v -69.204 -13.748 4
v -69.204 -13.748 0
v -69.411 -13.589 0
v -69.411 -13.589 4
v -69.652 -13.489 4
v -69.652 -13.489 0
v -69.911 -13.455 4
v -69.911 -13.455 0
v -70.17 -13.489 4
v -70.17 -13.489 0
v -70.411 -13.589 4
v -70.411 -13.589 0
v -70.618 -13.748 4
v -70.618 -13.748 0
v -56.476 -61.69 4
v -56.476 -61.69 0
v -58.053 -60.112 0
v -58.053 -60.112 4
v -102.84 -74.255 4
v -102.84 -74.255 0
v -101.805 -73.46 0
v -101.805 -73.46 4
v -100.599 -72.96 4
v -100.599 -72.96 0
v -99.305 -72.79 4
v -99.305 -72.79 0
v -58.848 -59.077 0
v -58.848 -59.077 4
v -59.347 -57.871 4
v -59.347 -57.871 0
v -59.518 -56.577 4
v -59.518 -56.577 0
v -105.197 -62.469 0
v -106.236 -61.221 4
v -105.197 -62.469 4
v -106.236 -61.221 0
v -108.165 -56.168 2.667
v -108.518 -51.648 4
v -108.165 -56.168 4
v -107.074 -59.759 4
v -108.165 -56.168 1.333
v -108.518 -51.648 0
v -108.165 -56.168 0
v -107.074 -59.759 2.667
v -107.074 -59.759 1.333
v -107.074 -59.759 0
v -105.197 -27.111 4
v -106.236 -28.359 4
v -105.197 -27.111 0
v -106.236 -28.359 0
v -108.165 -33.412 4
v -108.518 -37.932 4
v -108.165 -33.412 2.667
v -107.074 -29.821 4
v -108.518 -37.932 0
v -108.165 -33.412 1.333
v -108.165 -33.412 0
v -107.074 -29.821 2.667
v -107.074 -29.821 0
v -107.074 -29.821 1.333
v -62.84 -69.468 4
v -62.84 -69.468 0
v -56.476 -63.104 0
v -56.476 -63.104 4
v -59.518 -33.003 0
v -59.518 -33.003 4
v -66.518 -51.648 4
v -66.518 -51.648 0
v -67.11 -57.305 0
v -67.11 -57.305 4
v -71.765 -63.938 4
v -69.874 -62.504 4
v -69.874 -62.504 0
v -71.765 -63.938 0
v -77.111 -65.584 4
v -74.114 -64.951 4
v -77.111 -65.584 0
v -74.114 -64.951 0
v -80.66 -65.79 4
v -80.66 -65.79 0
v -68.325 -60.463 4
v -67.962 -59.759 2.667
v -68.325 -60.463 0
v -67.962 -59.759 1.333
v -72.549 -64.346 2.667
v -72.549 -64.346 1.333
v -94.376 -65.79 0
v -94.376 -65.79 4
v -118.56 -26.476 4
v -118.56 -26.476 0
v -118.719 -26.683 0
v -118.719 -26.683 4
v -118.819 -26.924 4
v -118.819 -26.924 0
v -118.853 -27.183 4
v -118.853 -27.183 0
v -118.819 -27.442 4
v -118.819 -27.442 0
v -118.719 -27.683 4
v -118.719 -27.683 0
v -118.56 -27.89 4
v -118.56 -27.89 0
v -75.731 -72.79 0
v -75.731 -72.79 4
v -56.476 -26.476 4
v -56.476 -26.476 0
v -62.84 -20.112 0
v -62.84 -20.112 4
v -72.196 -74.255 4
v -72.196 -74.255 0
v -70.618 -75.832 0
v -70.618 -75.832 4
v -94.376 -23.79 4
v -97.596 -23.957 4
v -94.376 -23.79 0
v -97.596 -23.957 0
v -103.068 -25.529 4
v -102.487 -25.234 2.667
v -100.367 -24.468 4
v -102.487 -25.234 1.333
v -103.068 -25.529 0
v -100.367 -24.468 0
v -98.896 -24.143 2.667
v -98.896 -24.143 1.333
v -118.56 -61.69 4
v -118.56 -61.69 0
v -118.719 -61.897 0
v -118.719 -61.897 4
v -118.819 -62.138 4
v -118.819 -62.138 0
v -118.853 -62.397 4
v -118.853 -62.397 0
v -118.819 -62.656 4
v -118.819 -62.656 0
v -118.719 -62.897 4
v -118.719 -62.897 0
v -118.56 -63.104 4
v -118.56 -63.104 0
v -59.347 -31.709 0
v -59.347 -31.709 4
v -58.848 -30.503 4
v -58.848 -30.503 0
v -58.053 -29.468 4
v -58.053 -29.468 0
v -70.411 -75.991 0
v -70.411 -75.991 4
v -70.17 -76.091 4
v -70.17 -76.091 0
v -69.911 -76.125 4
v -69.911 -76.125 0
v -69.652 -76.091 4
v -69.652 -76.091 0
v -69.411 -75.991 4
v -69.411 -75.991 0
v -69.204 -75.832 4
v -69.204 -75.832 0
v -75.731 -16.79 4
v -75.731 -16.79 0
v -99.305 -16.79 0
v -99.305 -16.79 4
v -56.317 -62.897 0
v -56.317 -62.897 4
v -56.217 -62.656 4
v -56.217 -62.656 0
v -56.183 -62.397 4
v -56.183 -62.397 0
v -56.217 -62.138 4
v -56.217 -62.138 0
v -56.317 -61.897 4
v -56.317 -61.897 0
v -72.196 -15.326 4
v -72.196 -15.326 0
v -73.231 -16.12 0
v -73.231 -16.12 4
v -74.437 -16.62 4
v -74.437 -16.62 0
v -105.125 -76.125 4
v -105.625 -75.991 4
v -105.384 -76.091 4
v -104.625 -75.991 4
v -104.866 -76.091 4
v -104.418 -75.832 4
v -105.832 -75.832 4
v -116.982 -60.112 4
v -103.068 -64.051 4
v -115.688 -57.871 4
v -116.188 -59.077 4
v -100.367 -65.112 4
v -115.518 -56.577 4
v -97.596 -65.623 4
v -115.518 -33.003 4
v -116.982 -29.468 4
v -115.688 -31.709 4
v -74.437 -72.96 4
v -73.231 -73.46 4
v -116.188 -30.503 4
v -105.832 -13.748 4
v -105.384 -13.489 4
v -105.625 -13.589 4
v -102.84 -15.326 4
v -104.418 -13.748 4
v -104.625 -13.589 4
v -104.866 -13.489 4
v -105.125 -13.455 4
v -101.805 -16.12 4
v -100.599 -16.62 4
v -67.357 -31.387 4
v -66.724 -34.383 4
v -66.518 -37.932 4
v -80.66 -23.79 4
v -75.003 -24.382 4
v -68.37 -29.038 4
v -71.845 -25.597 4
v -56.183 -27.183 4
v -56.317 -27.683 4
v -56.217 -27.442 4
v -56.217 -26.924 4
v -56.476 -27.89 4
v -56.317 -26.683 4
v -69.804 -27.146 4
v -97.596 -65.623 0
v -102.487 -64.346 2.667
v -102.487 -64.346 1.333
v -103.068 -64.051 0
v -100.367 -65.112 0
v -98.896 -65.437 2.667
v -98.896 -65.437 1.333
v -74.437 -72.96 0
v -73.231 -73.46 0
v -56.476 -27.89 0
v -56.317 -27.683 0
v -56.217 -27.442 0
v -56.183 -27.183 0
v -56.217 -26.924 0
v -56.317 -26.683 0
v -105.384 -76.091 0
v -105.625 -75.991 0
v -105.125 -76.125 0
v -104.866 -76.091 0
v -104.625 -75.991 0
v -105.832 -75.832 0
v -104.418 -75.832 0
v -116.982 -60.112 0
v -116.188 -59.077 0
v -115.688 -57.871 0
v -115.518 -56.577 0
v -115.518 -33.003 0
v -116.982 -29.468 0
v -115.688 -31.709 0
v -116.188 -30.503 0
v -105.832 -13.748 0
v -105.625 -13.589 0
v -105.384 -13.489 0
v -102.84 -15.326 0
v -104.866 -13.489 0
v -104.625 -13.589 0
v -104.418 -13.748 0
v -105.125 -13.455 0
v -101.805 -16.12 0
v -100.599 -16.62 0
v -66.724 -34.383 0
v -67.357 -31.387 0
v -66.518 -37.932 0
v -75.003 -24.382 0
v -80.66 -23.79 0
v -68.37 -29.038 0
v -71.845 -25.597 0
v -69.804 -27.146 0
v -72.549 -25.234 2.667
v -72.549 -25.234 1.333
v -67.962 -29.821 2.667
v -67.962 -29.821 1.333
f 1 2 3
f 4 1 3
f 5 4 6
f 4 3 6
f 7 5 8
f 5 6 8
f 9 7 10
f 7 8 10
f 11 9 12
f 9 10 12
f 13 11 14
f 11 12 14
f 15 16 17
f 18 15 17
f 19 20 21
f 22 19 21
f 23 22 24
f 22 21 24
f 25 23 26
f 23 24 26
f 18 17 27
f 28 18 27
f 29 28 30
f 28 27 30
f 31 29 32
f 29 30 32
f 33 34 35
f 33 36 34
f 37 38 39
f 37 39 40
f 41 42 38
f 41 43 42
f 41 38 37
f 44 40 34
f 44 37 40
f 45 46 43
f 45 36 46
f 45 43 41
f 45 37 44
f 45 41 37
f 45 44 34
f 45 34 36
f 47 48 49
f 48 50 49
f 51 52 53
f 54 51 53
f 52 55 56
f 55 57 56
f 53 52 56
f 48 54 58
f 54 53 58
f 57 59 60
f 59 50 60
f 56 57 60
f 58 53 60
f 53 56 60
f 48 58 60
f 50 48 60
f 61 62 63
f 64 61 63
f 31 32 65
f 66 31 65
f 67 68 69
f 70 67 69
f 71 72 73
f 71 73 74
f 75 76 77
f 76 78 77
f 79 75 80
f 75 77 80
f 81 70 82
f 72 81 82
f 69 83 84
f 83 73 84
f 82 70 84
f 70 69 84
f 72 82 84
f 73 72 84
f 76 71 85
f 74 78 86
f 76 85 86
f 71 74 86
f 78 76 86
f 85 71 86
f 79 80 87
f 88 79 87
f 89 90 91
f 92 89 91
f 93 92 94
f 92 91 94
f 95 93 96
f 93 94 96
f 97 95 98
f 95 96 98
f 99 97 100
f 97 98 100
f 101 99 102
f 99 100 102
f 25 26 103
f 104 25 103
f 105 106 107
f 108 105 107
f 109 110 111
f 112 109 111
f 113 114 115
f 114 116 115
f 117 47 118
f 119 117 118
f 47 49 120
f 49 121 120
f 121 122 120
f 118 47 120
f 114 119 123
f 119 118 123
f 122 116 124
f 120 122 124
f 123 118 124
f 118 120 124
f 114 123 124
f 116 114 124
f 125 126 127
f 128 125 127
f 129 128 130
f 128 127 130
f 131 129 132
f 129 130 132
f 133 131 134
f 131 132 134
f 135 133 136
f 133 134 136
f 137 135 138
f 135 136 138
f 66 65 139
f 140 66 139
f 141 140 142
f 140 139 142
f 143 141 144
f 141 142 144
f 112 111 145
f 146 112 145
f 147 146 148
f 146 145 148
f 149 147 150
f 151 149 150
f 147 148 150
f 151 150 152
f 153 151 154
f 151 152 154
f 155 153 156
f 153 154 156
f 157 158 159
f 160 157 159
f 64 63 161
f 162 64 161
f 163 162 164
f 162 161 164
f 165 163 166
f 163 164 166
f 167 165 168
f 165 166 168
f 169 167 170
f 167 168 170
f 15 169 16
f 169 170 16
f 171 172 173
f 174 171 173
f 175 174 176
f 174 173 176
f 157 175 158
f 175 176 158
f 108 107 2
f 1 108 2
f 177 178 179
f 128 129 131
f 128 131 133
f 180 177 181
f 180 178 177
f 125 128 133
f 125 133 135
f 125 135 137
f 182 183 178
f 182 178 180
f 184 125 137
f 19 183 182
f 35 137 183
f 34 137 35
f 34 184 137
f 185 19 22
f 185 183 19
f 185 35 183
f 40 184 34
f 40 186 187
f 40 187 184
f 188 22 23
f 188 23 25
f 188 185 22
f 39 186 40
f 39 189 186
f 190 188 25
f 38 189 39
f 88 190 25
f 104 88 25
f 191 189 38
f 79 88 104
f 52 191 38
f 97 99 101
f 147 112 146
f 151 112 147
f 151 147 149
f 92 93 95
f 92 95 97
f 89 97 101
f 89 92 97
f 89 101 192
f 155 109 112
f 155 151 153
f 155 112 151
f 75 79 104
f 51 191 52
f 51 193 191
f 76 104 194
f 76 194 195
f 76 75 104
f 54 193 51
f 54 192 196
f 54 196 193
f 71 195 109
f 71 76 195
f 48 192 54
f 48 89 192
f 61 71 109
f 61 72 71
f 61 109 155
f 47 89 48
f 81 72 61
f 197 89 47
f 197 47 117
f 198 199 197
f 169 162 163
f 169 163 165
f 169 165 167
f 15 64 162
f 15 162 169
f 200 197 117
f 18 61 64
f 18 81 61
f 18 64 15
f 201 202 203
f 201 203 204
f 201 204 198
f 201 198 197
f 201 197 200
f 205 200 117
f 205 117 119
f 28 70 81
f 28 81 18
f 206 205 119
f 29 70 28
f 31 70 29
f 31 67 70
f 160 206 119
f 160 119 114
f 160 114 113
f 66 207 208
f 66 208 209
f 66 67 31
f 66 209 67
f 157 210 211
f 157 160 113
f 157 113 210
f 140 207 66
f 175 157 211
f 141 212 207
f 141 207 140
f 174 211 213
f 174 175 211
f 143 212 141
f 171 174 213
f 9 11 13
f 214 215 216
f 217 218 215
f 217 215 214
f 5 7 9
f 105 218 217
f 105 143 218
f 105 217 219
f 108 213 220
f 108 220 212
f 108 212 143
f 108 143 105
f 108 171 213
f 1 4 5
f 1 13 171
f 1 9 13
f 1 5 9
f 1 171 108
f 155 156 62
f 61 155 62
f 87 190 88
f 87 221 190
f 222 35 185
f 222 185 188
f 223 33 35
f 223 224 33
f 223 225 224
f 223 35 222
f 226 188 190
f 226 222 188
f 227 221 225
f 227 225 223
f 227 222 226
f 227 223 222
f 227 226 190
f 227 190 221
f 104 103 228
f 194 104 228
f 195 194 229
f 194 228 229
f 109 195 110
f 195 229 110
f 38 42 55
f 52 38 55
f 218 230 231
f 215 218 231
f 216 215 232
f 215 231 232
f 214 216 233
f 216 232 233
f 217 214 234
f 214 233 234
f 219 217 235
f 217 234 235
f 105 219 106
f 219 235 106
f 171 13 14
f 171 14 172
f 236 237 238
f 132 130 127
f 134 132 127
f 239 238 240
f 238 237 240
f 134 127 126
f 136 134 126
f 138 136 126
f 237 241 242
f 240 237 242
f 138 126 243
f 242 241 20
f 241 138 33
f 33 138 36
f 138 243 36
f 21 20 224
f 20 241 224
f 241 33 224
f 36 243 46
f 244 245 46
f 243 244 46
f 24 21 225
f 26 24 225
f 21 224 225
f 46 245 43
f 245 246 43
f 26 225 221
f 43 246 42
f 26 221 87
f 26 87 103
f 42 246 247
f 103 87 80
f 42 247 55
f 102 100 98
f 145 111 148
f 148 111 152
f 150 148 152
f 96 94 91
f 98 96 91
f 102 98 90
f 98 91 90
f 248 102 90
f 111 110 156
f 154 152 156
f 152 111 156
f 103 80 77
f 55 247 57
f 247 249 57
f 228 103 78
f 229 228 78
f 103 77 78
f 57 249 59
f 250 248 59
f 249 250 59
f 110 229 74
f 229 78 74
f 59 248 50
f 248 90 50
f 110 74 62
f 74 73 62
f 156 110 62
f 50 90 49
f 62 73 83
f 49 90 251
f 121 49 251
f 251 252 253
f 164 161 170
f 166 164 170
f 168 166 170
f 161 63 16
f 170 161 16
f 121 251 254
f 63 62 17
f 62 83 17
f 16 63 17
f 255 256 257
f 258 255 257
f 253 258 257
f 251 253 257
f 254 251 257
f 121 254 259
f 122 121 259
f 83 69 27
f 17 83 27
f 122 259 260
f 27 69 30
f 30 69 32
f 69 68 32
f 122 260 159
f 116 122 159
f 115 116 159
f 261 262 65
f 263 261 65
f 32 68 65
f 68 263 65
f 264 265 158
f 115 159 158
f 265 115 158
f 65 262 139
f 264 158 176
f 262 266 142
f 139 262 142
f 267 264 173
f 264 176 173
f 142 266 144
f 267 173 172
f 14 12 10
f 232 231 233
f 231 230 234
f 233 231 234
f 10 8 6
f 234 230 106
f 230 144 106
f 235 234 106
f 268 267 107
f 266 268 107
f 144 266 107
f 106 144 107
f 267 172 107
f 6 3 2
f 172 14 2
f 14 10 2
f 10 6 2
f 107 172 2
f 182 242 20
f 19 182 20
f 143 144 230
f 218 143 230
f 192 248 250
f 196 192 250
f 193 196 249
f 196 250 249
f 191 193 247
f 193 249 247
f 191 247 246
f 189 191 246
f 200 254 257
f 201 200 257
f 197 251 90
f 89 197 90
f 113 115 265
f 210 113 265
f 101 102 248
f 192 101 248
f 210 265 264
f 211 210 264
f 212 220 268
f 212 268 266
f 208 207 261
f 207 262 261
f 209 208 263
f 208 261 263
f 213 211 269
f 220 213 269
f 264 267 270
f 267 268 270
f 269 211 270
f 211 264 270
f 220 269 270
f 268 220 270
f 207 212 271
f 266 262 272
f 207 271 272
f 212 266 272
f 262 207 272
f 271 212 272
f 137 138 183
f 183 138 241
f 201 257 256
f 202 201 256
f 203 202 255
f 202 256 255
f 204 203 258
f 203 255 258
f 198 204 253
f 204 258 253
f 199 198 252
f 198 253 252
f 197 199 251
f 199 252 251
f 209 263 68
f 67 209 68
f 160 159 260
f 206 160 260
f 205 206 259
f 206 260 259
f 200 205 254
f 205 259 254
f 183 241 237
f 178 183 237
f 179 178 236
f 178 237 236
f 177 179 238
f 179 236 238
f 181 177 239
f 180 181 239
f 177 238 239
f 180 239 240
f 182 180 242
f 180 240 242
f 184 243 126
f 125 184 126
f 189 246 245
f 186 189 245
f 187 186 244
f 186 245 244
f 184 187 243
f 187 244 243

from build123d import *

# Parameters (mm, degrees)
F1_DEPTH = 4


# Not quite as in the source:
# - a feature names something its author has since deleted; it is built from what else it names


with BuildPart() as f1:
    # F0 (on Top) → F1 (new body)
    with BuildSketch(Plane.XY):
        Polygon((-108.5178543984, -51.6479864335), (-108.5178543984, -37.9322576809), (-115.5178543984, -30.9322576809), (-115.5178543984, -33.0033254928), (-115.5178543984, -56.5769186216), (-115.5178543984, -58.6479864335), align=None)
        with BuildLine():
            Line((-115.5178543984, -33.0033254928), (-115.5178543984, -30.9322576809))
            Line((-115.5178543984, -30.9322576809), (-116.982320508, -29.4677915713))
            ThreePointArc((-116.982320508, -29.4677915713), (-115.89845674, -31.0899083208), (-115.5178543984, -33.0033254928))
        make_face()
        with BuildLine():
            Line((-58.0533882883, -29.4677915708), (-59.5178543984, -30.9322576809))
            Line((-59.5178543984, -30.9322576809), (-59.5178543984, -33.0033254928))
            ThreePointArc((-59.5178543984, -33.0033254928), (-59.1372520566, -31.0899083205), (-58.0533882883, -29.4677915708))
        make_face()
        Polygon((-66.5178543984, -37.9322576809), (-66.5178543984, -51.6479864335), (-59.5178543984, -58.6479864335), (-59.5178543984, -56.5769186216), (-59.5178543984, -33.0033254928), (-59.5178543984, -30.9322576809), align=None)
        with BuildLine():
            Line((-59.5178543984, -56.5769186216), (-59.5178543984, -58.6479864335))
            Line((-59.5178543984, -58.6479864335), (-58.0533883237, -60.1124525081))
            ThreePointArc((-58.0533883237, -60.1124525081), (-59.1372520662, -58.4903357707), (-59.5178543984, -56.5769186216))
        make_face()
        with BuildLine():
            Line((-116.982320508, -60.1124525431), (-115.5178543984, -58.6479864335))
            Line((-115.5178543984, -58.6479864335), (-115.5178543984, -56.5769186216))
            ThreePointArc((-115.5178543984, -56.5769186216), (-115.89845674, -58.4903357936), (-116.982320508, -60.1124525431))
        make_face()
        Polygon((-101.3757187746, -16.7901220572), (-94.3757187746, -23.7901220572), (-80.6599900221, -23.7901220572), (-73.6599900221, -16.7901220572), (-75.731057834, -16.7901220572), (-99.3046509628, -16.7901220572), align=None)
        with BuildLine():
            Line((-102.8401848842, -15.3256559476), (-101.3757187746, -16.7901220572))
            Line((-101.3757187746, -16.7901220572), (-99.3046509628, -16.7901220572))
            ThreePointArc((-99.3046509628, -16.7901220572), (-101.2180681347, -16.4095197156), (-102.8401848842, -15.3256559476))
        make_face()
        with BuildLine():
            Line((-75.731057834, -16.7901220572), (-73.6599900221, -16.7901220572))
            Line((-73.6599900221, -16.7901220572), (-72.1955238561, -15.3256558912))
            ThreePointArc((-72.1955238561, -15.3256558912), (-73.8176406251, -16.4095197003), (-75.731057834, -16.7901220572))
        make_face()
        Polygon((-73.6599900221, -72.7901220572), (-80.6599900221, -65.7901220572), (-94.3757187746, -65.7901220572), (-101.3757187746, -72.7901220572), (-99.3046509628, -72.7901220572), (-75.731057834, -72.7901220572), align=None)
        with BuildLine():
            Line((-99.3046509628, -72.7901220572), (-101.3757187746, -72.7901220572))
            Line((-101.3757187746, -72.7901220572), (-102.8401848842, -74.2545881668))
            ThreePointArc((-102.8401848842, -74.2545881668), (-101.2180681347, -73.1707243988), (-99.3046509628, -72.7901220572))
        make_face()
        with BuildLine():
            Line((-72.1955239691, -74.2545881102), (-73.6599900221, -72.7901220572))
            Line((-73.6599900221, -72.7901220572), (-75.731057834, -72.7901220572))
            ThreePointArc((-75.731057834, -72.7901220572), (-73.8176406989, -73.1707243835), (-72.1955239691, -74.2545881102))
        make_face()
        with BuildLine():
            Line((-105.1967865865, -27.1111898691), (-112.1958810618, -20.1120953938))
            Line((-112.1958810618, -20.1120953938), (-118.5598420925, -26.4760564245))
            ThreePointArc((-118.5598420925, -26.4760564245), (-118.8527353113, -27.1831632057), (-118.5598420925, -27.8902699868))
            Line((-118.5598420925, -27.8902699868), (-116.982320508, -29.4677915713))
            Line((-116.982320508, -29.4677915713), (-115.5178543984, -30.9322576809))
            Line((-115.5178543984, -30.9322576809), (-108.5178543984, -37.9322576809))
            add(Edge.make_bspline(
                [(-108.5178543984, -37.9322576809), (-108.5178543984, -32.9322576809), (-107.4823204924, -29.396723775), (-105.1967865865, -27.1111898691)],
                knots=[0, 0, 0, 0, 10, 10, 10, 10], degree=3))
        make_face()
        with BuildLine():
            Line((-105.8319200311, -13.7481343631), (-112.1958810618, -20.1120953938))
            Line((-112.1958810618, -20.1120953938), (-105.1967865865, -27.1111898691))
            add(Edge.make_bspline(
                [(-105.1967865865, -27.1111898691), (-102.9112526806, -24.8256559631), (-99.3757187746, -23.7901220572), (-94.3757187746, -23.7901220572)],
                knots=[10, 10, 10, 10, 20, 20, 20, 20], degree=3))
            Line((-94.3757187746, -23.7901220572), (-101.3757187746, -16.7901220572))
            Line((-101.3757187746, -16.7901220572), (-102.8401848842, -15.3256559476))
            Line((-102.8401848842, -15.3256559476), (-104.4177064687, -13.7481343631))
            ThreePointArc((-104.4177064687, -13.7481343631), (-105.1248132499, -13.4552411443), (-105.8319200311, -13.7481343631))
        make_face()
        with BuildLine():
            Line((-73.6599900221, -16.7901220572), (-80.6599900221, -23.7901220572))
            add(Edge.make_bspline(
                [(-80.6599900221, -23.7901220572), (-75.6599900221, -23.7901220572), (-72.1244561162, -24.8256559631), (-69.8389222102, -27.1111898691)],
                knots=[0, 0, 0, 0, 10, 10, 10, 10], degree=3))
            Line((-69.8389222102, -27.1111898691), (-62.839827735, -20.1120953938))
            Line((-62.839827735, -20.1120953938), (-69.2037887656, -13.7481343631))
            ThreePointArc((-69.2037887656, -13.7481343631), (-69.9108955468, -13.4552411443), (-70.618002328, -13.7481343631))
            Line((-70.618002328, -13.7481343631), (-72.1955238561, -15.3256558912))
            Line((-72.1955238561, -15.3256558912), (-73.6599900221, -16.7901220572))
        make_face()
        with BuildLine():
            Line((-62.839827735, -20.1120953938), (-69.8389222102, -27.1111898691))
            add(Edge.make_bspline(
                [(-69.8389222102, -27.1111898691), (-67.5533883043, -29.396723775), (-66.5178543984, -32.9322576809), (-66.5178543984, -37.9322576809)],
                knots=[10, 10, 10, 10, 20, 20, 20, 20], degree=3))
            Line((-66.5178543984, -37.9322576809), (-59.5178543984, -30.9322576809))
            Line((-59.5178543984, -30.9322576809), (-58.0533882883, -29.4677915708))
            Line((-58.0533882883, -29.4677915708), (-56.4758667043, -27.8902699868))
            ThreePointArc((-56.4758667043, -27.8902699868), (-56.1829734855, -27.1831632057), (-56.4758667043, -26.4760564245))
            Line((-56.4758667043, -26.4760564245), (-62.839827735, -20.1120953938))
        make_face()
        with BuildLine():
            add(Edge.make_bspline(
                [(-69.8389222102, -62.4690542453), (-67.5533883043, -60.1835203394), (-66.5178543984, -56.6479864335), (-66.5178543984, -51.6479864335)],
                knots=[10, 10, 10, 10, 20, 20, 20, 20], degree=3))
            Line((-69.8389222102, -62.4690542453), (-62.839827735, -69.4681487206))
            Line((-62.839827735, -69.4681487206), (-56.4758667043, -63.1041876899))
            ThreePointArc((-56.4758667043, -63.1041876899), (-56.1829734855, -62.3970809087), (-56.4758667043, -61.6899741276))
            Line((-56.4758667043, -61.6899741276), (-58.0533883237, -60.1124525081))
            Line((-58.0533883237, -60.1124525081), (-59.5178543984, -58.6479864335))
            Line((-59.5178543984, -58.6479864335), (-66.5178543984, -51.6479864335))
        make_face()
        with BuildLine():
            Line((-62.839827735, -69.4681487206), (-69.8389222102, -62.4690542453))
            add(Edge.make_bspline(
                [(-80.6599900221, -65.7901220572), (-75.6599900221, -65.7901220572), (-72.1244561162, -64.7545881513), (-69.8389222102, -62.4690542453)],
                knots=[0, 0, 0, 0, 10, 10, 10, 10], degree=3))
            Line((-80.6599900221, -65.7901220572), (-73.6599900221, -72.7901220572))
            Line((-73.6599900221, -72.7901220572), (-72.1955239691, -74.2545881102))
            Line((-72.1955239691, -74.2545881102), (-70.618002328, -75.8321097513))
            ThreePointArc((-70.618002328, -75.8321097513), (-69.9108955468, -76.1250029701), (-69.2037887656, -75.8321097513))
            Line((-69.2037887656, -75.8321097513), (-62.839827735, -69.4681487206))
        make_face()
        with BuildLine():
            add(Edge.make_bspline(
                [(-105.1967865865, -62.4690542453), (-102.9112526806, -64.7545881513), (-99.3757187746, -65.7901220572), (-94.3757187746, -65.7901220572)],
                knots=[10, 10, 10, 10, 20, 20, 20, 20], degree=3))
            Line((-105.1967865865, -62.4690542453), (-112.1958810618, -69.4681487206))
            Line((-112.1958810618, -69.4681487206), (-105.8319200311, -75.8321097513))
            ThreePointArc((-105.8319200311, -75.8321097513), (-105.1248132499, -76.1250029701), (-104.4177064687, -75.8321097513))
            Line((-104.4177064687, -75.8321097513), (-102.8401848842, -74.2545881668))
            Line((-102.8401848842, -74.2545881668), (-101.3757187746, -72.7901220572))
            Line((-101.3757187746, -72.7901220572), (-94.3757187746, -65.7901220572))
        make_face()
        with BuildLine():
            add(Edge.make_bspline(
                [(-108.5178543984, -51.6479864335), (-108.5178543984, -56.6479864335), (-107.4823204924, -60.1835203394), (-105.1967865865, -62.4690542453)],
                knots=[0, 0, 0, 0, 10, 10, 10, 10], degree=3))
            Line((-108.5178543984, -51.6479864335), (-115.5178543984, -58.6479864335))
            Line((-115.5178543984, -58.6479864335), (-116.982320508, -60.1124525431))
            Line((-116.982320508, -60.1124525431), (-118.5598420925, -61.6899741276))
            ThreePointArc((-118.5598420925, -61.6899741276), (-118.8527353113, -62.3970809087), (-118.5598420925, -63.1041876899))
            Line((-118.5598420925, -63.1041876899), (-112.1958810618, -69.4681487206))
            Line((-112.1958810618, -69.4681487206), (-105.1967865865, -62.4690542453))
        make_face()
    extrude(amount=F1_DEPTH)


solid = f1.part
